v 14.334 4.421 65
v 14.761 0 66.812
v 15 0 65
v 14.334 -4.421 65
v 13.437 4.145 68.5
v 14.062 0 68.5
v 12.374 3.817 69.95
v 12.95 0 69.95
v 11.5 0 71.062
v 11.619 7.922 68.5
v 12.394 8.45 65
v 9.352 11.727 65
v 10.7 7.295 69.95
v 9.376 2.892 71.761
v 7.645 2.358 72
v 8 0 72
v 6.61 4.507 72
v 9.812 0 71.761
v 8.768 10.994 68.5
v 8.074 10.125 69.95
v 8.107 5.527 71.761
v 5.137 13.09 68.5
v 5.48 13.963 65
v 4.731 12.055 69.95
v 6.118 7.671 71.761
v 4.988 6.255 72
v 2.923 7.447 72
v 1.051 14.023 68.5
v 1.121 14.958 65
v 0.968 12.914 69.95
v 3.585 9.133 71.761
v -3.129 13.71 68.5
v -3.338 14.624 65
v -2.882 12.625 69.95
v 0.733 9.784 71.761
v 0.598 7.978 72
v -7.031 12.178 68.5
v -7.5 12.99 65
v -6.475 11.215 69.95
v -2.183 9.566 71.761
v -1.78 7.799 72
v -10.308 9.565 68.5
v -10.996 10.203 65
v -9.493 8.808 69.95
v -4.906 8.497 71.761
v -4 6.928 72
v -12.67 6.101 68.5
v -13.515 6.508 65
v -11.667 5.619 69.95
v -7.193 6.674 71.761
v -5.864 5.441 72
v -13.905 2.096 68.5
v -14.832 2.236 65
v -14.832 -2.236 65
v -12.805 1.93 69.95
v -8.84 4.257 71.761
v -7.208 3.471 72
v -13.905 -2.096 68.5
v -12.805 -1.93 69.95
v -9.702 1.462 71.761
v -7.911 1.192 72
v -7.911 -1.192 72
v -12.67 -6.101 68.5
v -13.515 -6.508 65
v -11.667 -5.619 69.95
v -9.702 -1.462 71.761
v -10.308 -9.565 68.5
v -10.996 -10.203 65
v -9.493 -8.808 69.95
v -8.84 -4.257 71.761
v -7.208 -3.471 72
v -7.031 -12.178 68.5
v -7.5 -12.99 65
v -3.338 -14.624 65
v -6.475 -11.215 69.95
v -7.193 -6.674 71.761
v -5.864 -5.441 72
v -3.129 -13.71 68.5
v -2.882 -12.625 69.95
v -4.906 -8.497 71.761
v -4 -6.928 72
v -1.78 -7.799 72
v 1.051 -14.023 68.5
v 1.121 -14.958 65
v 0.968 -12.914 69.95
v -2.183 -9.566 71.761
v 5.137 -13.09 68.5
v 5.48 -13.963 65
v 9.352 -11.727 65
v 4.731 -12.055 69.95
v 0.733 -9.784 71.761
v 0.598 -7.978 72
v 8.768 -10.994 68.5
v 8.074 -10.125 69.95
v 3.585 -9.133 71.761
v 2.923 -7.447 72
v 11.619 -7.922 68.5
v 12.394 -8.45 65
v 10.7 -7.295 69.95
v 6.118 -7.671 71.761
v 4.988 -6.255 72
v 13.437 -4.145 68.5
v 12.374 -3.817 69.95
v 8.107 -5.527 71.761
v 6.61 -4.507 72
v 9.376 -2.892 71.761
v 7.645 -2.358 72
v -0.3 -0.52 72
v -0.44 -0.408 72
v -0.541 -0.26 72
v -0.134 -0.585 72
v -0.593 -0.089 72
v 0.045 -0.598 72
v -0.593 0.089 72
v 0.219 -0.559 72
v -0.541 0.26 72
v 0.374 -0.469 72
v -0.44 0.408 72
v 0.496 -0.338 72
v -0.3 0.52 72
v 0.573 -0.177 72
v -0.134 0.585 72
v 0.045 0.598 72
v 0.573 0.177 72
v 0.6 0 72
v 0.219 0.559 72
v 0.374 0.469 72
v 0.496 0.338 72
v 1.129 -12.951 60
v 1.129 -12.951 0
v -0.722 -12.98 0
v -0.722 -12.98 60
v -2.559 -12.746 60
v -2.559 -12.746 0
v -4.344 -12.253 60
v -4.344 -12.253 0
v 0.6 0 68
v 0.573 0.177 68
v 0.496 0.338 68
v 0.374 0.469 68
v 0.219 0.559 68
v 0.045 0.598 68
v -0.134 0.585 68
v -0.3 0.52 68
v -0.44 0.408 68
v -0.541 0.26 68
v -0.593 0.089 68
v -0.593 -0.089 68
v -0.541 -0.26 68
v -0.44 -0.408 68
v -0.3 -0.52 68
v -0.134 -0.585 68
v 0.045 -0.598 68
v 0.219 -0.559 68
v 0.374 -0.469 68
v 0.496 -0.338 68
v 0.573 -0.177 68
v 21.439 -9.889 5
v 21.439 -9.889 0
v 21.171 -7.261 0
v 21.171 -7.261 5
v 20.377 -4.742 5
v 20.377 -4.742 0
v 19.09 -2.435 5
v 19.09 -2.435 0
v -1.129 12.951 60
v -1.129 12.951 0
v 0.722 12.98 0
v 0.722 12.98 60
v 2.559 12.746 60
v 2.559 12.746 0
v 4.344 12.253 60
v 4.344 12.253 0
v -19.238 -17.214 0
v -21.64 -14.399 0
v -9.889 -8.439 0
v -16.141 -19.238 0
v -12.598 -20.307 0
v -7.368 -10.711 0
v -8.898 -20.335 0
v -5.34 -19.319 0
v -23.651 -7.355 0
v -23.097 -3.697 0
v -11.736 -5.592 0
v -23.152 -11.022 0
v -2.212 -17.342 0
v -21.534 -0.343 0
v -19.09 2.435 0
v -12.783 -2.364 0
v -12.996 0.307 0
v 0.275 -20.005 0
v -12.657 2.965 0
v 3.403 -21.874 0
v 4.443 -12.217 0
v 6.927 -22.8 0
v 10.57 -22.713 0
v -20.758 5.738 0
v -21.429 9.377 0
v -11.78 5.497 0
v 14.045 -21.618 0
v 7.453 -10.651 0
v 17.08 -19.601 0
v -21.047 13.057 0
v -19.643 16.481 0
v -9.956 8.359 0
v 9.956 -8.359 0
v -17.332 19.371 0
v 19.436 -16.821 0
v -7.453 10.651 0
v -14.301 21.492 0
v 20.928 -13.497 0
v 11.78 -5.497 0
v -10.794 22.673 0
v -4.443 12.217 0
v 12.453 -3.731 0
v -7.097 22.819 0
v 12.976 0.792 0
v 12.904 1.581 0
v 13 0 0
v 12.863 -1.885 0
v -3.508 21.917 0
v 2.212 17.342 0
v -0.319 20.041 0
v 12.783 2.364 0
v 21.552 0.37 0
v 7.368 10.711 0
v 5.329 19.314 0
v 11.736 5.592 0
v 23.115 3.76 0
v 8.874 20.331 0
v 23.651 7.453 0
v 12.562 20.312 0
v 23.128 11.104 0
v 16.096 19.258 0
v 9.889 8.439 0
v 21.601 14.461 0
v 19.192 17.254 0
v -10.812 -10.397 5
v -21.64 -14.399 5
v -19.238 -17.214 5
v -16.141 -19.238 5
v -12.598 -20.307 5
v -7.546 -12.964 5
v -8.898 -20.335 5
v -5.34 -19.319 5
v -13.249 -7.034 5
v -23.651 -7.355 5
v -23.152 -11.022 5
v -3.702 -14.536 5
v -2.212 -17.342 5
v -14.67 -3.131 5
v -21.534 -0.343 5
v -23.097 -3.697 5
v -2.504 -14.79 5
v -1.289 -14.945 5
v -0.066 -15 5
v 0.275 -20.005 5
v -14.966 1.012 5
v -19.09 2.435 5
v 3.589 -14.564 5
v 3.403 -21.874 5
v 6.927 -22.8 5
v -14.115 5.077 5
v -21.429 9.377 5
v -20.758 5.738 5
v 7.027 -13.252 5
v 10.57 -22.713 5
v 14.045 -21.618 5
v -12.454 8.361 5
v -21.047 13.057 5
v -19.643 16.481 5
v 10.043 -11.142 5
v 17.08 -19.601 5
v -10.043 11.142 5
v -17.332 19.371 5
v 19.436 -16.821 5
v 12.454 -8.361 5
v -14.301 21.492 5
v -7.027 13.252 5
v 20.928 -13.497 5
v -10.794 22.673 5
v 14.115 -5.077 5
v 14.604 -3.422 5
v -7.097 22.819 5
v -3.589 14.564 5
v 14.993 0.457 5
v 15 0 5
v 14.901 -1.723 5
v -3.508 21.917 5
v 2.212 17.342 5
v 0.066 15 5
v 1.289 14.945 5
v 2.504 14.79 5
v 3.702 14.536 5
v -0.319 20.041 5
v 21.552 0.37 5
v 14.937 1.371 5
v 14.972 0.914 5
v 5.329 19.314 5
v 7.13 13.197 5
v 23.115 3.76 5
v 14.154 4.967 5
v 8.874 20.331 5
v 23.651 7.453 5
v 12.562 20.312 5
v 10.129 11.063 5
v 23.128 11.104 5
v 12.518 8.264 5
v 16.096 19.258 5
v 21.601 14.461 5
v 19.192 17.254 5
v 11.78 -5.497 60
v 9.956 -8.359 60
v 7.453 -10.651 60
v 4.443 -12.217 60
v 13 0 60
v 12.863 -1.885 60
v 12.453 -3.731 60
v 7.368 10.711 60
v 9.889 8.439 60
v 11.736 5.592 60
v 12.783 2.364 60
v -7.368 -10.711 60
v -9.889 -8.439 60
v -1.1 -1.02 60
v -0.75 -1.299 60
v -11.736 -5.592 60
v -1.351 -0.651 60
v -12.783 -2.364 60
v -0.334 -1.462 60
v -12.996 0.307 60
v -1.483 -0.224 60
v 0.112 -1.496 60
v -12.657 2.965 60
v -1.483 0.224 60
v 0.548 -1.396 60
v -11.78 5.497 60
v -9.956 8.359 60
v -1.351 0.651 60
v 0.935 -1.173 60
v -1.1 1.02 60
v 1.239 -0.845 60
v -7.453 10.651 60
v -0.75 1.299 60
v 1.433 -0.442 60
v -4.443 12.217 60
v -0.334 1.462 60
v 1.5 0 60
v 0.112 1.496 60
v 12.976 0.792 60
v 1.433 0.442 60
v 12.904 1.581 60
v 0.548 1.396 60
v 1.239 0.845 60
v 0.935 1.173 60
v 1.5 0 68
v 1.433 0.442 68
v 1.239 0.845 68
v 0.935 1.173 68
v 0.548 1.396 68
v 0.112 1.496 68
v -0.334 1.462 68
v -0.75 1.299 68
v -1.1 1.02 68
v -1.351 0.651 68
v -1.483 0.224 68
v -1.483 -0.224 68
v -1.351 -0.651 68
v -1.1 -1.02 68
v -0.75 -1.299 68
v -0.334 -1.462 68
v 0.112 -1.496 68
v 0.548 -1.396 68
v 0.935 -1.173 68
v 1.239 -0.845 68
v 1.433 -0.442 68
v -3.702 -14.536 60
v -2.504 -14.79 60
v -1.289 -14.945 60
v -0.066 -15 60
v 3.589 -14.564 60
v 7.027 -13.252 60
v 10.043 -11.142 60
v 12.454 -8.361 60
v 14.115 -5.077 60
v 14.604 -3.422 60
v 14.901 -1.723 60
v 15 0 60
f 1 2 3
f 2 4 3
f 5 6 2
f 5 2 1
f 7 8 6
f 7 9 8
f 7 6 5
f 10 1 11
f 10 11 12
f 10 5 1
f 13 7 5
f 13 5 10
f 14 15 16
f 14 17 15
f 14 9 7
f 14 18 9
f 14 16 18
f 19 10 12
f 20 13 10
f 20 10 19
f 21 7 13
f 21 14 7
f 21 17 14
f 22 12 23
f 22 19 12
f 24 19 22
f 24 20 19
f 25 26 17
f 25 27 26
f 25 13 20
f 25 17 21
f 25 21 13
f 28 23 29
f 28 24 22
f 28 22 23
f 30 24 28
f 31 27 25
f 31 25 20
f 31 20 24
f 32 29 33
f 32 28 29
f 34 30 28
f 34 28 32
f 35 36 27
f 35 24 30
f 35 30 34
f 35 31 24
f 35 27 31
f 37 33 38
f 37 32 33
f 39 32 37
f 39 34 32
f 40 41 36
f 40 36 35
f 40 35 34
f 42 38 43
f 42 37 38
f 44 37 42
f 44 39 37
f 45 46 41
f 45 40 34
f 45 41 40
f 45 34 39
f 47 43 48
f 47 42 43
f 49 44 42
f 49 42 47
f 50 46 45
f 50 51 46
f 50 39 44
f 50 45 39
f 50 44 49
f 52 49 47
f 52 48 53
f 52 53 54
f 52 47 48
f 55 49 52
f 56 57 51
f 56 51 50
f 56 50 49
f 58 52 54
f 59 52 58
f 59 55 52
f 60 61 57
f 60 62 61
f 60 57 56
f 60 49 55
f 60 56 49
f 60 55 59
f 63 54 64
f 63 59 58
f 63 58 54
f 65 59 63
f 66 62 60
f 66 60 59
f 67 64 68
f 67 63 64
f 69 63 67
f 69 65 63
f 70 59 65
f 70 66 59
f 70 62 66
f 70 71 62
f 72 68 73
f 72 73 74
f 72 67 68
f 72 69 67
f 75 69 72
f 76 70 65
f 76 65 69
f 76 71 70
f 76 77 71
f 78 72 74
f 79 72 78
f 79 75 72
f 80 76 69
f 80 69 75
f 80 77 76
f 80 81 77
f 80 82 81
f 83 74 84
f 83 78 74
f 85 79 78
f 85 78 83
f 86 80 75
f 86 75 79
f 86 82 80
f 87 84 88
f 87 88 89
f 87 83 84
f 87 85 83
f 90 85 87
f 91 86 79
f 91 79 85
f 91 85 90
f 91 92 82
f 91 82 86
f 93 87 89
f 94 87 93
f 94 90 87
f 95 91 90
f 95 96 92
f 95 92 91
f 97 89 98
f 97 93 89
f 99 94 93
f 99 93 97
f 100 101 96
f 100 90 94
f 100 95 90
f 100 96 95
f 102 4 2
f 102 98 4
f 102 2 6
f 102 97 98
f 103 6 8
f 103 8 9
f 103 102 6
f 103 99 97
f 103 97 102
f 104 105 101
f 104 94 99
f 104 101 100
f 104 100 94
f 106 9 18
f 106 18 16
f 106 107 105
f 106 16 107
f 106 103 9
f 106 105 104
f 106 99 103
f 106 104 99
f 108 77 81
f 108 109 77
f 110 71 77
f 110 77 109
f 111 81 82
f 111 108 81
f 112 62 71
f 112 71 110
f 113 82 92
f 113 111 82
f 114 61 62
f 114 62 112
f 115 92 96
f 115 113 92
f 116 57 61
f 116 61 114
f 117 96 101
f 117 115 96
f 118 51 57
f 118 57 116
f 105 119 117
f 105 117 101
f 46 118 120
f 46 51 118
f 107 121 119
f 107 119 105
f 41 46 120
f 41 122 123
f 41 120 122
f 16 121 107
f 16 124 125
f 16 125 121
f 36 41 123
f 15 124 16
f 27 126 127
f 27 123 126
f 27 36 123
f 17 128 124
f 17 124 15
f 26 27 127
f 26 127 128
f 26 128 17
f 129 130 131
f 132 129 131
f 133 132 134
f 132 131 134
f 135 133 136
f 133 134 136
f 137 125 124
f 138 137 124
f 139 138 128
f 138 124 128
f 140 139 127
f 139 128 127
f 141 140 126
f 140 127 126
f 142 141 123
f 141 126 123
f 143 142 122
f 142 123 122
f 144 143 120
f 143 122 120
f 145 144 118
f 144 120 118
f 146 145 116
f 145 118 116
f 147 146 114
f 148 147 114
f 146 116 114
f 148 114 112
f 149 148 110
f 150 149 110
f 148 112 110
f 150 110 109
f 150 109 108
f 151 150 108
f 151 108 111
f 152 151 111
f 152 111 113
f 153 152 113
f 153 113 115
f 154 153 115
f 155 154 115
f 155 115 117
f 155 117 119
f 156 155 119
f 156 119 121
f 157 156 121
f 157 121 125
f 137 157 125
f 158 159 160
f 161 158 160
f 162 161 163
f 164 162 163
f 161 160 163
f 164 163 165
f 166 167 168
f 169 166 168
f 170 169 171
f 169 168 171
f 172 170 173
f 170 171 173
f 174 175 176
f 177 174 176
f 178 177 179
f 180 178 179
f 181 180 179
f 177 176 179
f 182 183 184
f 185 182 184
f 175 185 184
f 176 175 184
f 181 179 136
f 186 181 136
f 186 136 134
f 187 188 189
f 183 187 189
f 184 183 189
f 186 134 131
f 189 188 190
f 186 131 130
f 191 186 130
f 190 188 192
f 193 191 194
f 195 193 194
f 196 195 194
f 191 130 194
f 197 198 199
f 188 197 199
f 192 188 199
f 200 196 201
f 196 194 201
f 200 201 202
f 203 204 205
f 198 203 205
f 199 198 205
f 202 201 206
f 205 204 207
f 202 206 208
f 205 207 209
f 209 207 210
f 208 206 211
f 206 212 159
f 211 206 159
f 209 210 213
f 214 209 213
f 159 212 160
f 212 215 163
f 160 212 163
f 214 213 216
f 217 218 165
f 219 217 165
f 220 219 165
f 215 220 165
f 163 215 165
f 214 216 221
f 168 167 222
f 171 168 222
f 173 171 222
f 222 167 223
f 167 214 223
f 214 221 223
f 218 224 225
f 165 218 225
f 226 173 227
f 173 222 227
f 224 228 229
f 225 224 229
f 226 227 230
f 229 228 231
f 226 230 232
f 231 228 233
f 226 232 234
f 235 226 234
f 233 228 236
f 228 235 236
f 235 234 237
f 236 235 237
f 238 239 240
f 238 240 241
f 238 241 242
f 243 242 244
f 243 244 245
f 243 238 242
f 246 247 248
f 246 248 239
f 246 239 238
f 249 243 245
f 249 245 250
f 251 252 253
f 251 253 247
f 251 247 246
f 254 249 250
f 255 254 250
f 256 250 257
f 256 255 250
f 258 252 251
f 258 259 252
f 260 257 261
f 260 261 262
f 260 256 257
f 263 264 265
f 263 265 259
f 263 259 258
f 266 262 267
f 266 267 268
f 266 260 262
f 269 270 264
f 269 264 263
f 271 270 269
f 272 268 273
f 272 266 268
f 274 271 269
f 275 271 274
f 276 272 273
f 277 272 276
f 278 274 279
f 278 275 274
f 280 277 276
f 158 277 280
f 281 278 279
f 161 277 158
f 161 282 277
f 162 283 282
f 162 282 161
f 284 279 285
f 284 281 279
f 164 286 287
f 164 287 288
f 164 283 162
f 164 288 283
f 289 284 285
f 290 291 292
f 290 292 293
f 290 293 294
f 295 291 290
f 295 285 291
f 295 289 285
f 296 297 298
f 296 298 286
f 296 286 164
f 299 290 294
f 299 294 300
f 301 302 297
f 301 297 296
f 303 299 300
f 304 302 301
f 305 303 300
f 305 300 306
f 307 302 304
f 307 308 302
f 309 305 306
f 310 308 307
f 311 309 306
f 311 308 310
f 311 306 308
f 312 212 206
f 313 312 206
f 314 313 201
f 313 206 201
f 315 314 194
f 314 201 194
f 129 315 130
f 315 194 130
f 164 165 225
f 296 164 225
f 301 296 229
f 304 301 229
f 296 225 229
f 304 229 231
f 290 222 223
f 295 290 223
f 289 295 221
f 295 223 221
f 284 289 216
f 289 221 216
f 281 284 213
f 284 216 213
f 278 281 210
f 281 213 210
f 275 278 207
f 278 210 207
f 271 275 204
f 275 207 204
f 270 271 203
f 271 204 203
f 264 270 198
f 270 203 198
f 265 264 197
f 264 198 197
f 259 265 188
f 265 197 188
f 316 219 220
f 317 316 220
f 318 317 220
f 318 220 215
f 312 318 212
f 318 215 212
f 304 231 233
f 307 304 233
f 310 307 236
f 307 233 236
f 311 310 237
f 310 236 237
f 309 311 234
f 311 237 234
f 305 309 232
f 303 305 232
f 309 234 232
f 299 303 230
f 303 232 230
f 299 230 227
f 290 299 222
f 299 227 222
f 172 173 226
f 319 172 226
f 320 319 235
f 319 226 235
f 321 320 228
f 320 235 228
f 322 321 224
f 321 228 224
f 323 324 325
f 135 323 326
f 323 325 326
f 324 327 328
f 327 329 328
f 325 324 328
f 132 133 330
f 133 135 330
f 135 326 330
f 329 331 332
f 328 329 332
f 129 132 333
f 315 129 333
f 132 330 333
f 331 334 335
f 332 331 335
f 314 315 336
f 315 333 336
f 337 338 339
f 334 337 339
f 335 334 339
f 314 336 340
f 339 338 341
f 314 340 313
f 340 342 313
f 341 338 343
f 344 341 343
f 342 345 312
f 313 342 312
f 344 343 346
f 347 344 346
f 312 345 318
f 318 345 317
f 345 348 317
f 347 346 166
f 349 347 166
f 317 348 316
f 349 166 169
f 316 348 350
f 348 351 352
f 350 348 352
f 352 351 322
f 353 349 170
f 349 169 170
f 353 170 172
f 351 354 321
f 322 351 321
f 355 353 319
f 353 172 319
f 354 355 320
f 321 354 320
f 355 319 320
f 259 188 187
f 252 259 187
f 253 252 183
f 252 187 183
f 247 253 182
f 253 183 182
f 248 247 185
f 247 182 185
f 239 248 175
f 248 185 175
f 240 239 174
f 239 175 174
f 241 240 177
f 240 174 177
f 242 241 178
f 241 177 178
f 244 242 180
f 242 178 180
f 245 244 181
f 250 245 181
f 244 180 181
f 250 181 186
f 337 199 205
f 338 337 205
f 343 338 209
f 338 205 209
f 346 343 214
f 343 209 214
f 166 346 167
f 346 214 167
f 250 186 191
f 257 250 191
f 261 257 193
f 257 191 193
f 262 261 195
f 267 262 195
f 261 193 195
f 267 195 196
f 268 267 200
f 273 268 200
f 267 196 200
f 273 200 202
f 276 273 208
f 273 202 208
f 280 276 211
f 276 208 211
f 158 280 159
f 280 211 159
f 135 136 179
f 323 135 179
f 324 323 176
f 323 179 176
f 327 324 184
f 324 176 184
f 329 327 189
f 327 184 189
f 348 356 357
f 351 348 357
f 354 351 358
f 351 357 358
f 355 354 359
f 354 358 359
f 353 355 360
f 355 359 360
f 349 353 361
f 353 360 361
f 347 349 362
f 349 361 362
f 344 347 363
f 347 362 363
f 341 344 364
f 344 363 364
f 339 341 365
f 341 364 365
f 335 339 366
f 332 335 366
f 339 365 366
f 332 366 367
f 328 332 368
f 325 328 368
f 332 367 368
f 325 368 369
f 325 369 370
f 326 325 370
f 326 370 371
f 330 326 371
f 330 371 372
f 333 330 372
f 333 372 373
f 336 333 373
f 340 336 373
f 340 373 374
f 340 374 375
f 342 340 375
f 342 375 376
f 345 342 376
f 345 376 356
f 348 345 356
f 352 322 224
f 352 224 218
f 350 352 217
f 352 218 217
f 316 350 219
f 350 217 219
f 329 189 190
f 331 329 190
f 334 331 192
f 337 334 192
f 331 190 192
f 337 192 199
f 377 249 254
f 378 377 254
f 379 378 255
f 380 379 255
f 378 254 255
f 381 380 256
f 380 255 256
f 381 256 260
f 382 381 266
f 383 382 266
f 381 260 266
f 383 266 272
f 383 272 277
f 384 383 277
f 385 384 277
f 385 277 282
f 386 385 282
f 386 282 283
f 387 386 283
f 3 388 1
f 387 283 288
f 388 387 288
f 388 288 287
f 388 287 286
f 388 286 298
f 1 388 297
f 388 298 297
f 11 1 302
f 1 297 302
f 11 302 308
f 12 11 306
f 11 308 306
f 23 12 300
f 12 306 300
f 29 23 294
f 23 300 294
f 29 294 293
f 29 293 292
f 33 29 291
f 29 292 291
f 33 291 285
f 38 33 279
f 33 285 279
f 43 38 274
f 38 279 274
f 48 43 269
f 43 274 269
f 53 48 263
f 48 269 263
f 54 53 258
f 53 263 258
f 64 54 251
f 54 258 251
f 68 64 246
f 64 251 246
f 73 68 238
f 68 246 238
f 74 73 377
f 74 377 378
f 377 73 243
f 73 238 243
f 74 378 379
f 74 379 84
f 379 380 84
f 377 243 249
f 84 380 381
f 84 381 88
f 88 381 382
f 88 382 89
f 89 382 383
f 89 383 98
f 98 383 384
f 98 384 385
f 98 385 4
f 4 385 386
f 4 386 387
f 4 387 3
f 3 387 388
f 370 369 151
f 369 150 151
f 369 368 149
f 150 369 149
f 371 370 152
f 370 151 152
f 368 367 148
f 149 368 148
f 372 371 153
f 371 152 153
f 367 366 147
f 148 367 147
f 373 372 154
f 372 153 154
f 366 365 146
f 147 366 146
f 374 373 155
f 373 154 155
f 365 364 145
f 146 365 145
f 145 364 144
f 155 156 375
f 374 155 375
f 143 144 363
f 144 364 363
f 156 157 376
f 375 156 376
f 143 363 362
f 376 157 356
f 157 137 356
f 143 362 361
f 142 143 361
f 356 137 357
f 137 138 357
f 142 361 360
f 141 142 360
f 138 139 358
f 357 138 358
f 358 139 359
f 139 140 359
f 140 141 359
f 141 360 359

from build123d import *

# Parameters (mm, degrees)
F1_DEPTH  = 60
F2_DEPTH  = 5
F3_R      = 15
F4_DEPTH  = 8
F5_R      = 1.5
F6_DEPTH  = 68.001
F7_R      = 15
F8_DEPTH  = 4
F9_R      = 0.6
F11_DEPTH = 72.001


# Not quite as in the source:
# - a fillet or chamfer that OpenCascade refuses, or shapes differently, is made with other operations: its cross-section is extruded or revolved along the edge and cut away or added


with BuildPart() as f1:
    # F0 (on Top) → F1 (new body)
    with BuildSketch(Plane.XY):
        with BuildLine():
            ThreePointArc((4.344342247, 12.2526197379), (9.8886206176, 8.4389088324), (12.7832510794, 2.3639991203))
            ThreePointArc((12.7832510794, 2.3639991203), (13.8829504808, 1.9165651298), (14.9372441283, 1.3706705849))
            ThreePointArc((14.9372441283, 1.3706705849), (11.4099468664, 9.7372024989), (3.7020104756, 14.5359938923))
            ThreePointArc((3.7020104756, 14.5359938923), (4.0753636897, 13.4089875362), (4.344342247, 12.2526197379))
        make_face()
        with BuildLine():
            ThreePointArc((12.7832510794, 2.3639991203), (12.9456993637, 1.1869574482), (13, 0))
            ThreePointArc((13, 0), (12.6914373848, -2.8155669247), (11.7803973681, -5.4974755888))
            ThreePointArc((11.7803973681, -5.4974755888), (12.9572055714, -5.3404456491), (14.1147802532, -5.0767094072))
            ThreePointArc((14.1147802532, -5.0767094072), (14.7770379948, -2.5766544396), (15, 0))
            ThreePointArc((15, 0), (14.9843028187, 0.6860532326), (14.9372441283, 1.3706705849))
            ThreePointArc((14.9372441283, 1.3706705849), (13.8829504808, 1.9165651298), (12.7832510794, 2.3639991203))
        make_face()
        with BuildLine():
            ThreePointArc((14.1147802532, -5.0767094072), (12.9572055714, -5.3404456491), (11.7803973681, -5.4974755888))
            ThreePointArc((11.7803973681, -5.4974755888), (7.453385593, -10.6511522007), (1.1292451674, -12.9508611819))
            ThreePointArc((1.1292451674, -12.9508611819), (0.5785791746, -14.0026705342), (-0.0657478246, -14.9998559068))
            ThreePointArc((-0.0657478246, -14.9998559068), (8.6000602997, -12.2897910008), (14.1147802532, -5.0767094072))
        make_face()
        with BuildLine():
            ThreePointArc((-0.0657478246, -14.9998559068), (0.5785791746, -14.0026705342), (1.1292451674, -12.9508611819))
            ThreePointArc((1.1292451674, -12.9508611819), (-1.6450220625, -12.8954993084), (-4.344342247, -12.2526197379))
            ThreePointArc((-4.344342247, -12.2526197379), (-4.0753636897, -13.4089875362), (-3.7020104756, -14.5359938923))
            ThreePointArc((-3.7020104756, -14.5359938923), (-1.8981023799, -14.879422279), (-0.0657478246, -14.9998559068))
        make_face()
        with BuildLine():
            ThreePointArc((-3.7020104756, -14.5359938923), (-4.0753636897, -13.4089875362), (-4.344342247, -12.2526197379))
            ThreePointArc((-4.344342247, -12.2526197379), (-9.8886206176, -8.4389088324), (-12.7832510794, -2.3639991203))
            ThreePointArc((-12.7832510794, -2.3639991203), (-13.8829504808, -1.9165651298), (-14.9372441283, -1.3706705849))
            ThreePointArc((-14.9372441283, -1.3706705849), (-11.4099468664, -9.7372024989), (-3.7020104756, -14.5359938923))
        make_face()
        with BuildLine():
            ThreePointArc((-12.7832510794, -2.3639991203), (-12.8954993084, 1.6450220625), (-11.7803973681, 5.4974755888))
            ThreePointArc((-11.7803973681, 5.4974755888), (-12.9572055714, 5.3404456491), (-14.1147802532, 5.0767094072))
            ThreePointArc((-14.1147802532, 5.0767094072), (-14.879422279, 1.8981023799), (-14.9372441283, -1.3706705849))
            ThreePointArc((-14.9372441283, -1.3706705849), (-13.8829504808, -1.9165651298), (-12.7832510794, -2.3639991203))
        make_face()
        with BuildLine():
            ThreePointArc((-11.7803973681, 5.4974755888), (-7.453385593, 10.6511522007), (-1.1292451674, 12.9508611819))
            ThreePointArc((-1.1292451674, 12.9508611819), (-0.5785791746, 14.0026705342), (0.0657478246, 14.9998559068))
            ThreePointArc((0.0657478246, 14.9998559068), (-8.6000602997, 12.2897910008), (-14.1147802532, 5.0767094072))
            ThreePointArc((-14.1147802532, 5.0767094072), (-12.9572055714, 5.3404456491), (-11.7803973681, 5.4974755888))
        make_face()
        with BuildLine():
            ThreePointArc((-1.1292451674, 12.9508611819), (1.6450220625, 12.8954993084), (4.344342247, 12.2526197379))
            ThreePointArc((4.344342247, 12.2526197379), (4.0753636897, 13.4089875362), (3.7020104756, 14.5359938923))
            ThreePointArc((3.7020104756, 14.5359938923), (1.8981023799, 14.879422279), (0.0657478246, 14.9998559068))
            ThreePointArc((0.0657478246, 14.9998559068), (-0.5785791746, 14.0026705342), (-1.1292451674, 12.9508611819))
        make_face()
    extrude(amount=F1_DEPTH)

    # F0 (on Top) → F2 (join)
    with BuildSketch(Plane.XY):
        with BuildLine():
            ThreePointArc((3.7020104756, 14.5359938923), (11.4099468664, 9.7372024989), (14.9372441283, 1.3706705849))
            ThreePointArc((14.9372441283, 1.3706705849), (17.2222714986, -0.3046475231), (19.0900610331, -2.4352350245))
            ThreePointArc((19.0900610331, -2.4352350245), (22.4559354435, 2.0084712145), (23.6511522007, 7.453385593))
            ThreePointArc((23.6511522007, 7.453385593), (16.0960665792, 19.2581688359), (2.2122433682, 17.3420062106))
            ThreePointArc((2.2122433682, 17.3420062106), (3.0431666419, 15.9846802304), (3.7020104756, 14.5359938923))
        make_face()
        with BuildLine():
            ThreePointArc((19.0900610331, -2.4352350245), (17.2222714986, -0.3046475231), (14.9372441283, 1.3706705849))
            ThreePointArc((14.9372441283, 1.3706705849), (14.9843028187, 0.6860532326), (15, 0))
            ThreePointArc((15, 0), (14.7770379948, -2.5766544396), (14.1147802532, -5.0767094072))
            ThreePointArc((14.1147802532, -5.0767094072), (16.7472118135, -4.0286898812), (19.0900610331, -2.4352350245))
        make_face()
        with BuildLine():
            ThreePointArc((19.0900610331, -2.4352350245), (16.7472118135, -4.0286898812), (14.1147802532, -5.0767094072))
            ThreePointArc((14.1147802532, -5.0767094072), (8.6000602997, -12.2897910008), (-0.0657478246, -14.9998559068))
            ThreePointArc((-0.0657478246, -14.9998559068), (-1.0671791062, -16.2367482592), (-2.2122433682, -17.3420062106))
            ThreePointArc((-2.2122433682, -17.3420062106), (12.346275042, -22.2875112657), (21.4389088324, -9.8886206176))
            ThreePointArc((21.4389088324, -9.8886206176), (20.8377994805, -5.981254408), (19.0900610331, -2.4352350245))
        make_face()
        with BuildLine():
            ThreePointArc((0.0657478246, 14.9998559068), (1.8981023799, 14.879422279), (3.7020104756, 14.5359938923))
            ThreePointArc((3.7020104756, 14.5359938923), (3.0431666419, 15.9846802304), (2.2122433682, 17.3420062106))
            ThreePointArc((2.2122433682, 17.3420062106), (1.0671791062, 16.2367482592), (0.0657478246, 14.9998559068))
        make_face()
        with BuildLine():
            ThreePointArc((-2.2122433682, -17.3420062106), (-1.0671791062, -16.2367482592), (-0.0657478246, -14.9998559068))
            ThreePointArc((-0.0657478246, -14.9998559068), (-1.8981023799, -14.879422279), (-3.7020104756, -14.5359938923))
            ThreePointArc((-3.7020104756, -14.5359938923), (-3.0431666419, -15.9846802304), (-2.2122433682, -17.3420062106))
        make_face()
        with BuildLine():
            ThreePointArc((-14.1147802532, 5.0767094072), (-8.6000602997, 12.2897910008), (0.0657478246, 14.9998559068))
            ThreePointArc((0.0657478246, 14.9998559068), (1.0671791062, 16.2367482592), (2.2122433682, 17.3420062106))
            ThreePointArc((2.2122433682, 17.3420062106), (-15.8922944255, 20.5397728182), (-19.0900610331, 2.4352350245))
            ThreePointArc((-19.0900610331, 2.4352350245), (-16.7472118135, 4.0286898812), (-14.1147802532, 5.0767094072))
        make_face()
        with BuildLine():
            ThreePointArc((-2.2122433682, -17.3420062106), (-3.0431666419, -15.9846802304), (-3.7020104756, -14.5359938923))
            ThreePointArc((-3.7020104756, -14.5359938923), (-11.4099468664, -9.7372024989), (-14.9372441283, -1.3706705849))
            ThreePointArc((-14.9372441283, -1.3706705849), (-17.2222714986, 0.3046475231), (-19.0900610331, 2.4352350245))
            ThreePointArc((-19.0900610331, 2.4352350245), (-20.5397728182, -15.8922944255), (-2.2122433682, -17.3420062106))
        make_face()
        with BuildLine():
            ThreePointArc((-14.9372441283, -1.3706705849), (-14.879422279, 1.8981023799), (-14.1147802532, 5.0767094072))
            ThreePointArc((-14.1147802532, 5.0767094072), (-16.7472118135, 4.0286898812), (-19.0900610331, 2.4352350245))
            ThreePointArc((-19.0900610331, 2.4352350245), (-17.2222714986, 0.3046475231), (-14.9372441283, -1.3706705849))
        make_face()
    extrude(amount=F2_DEPTH)

    # F3 (on face) → F4 (join)
    with BuildSketch(Plane.XY.offset(60)):
        Circle(F3_R)
    extrude(amount=F4_DEPTH)

    # F5 (on face) → F6 (cut, through all)
    with BuildSketch(Plane.XY.offset(68)):
        Circle(F5_R)
    extrude(amount=-F6_DEPTH, mode=Mode.SUBTRACT)

    # F7 (on face) → F8 (join)
    with BuildSketch(Plane.XY.offset(68)):
        Circle(F7_R)
    extrude(amount=F8_DEPTH)

    # F10: fillet of radius 7 on 1 edges, made by hand

    # F10_s1 → F10_t2 (revolve, cut)
    with BuildSketch(Plane.XZ):
        with BuildLine():
            ThreePointArc((15, 65), (12.9497474683, 69.9497474683), (8, 72))
            Line((8, 72), (15, 72))
            Line((15, 72), (15, 65))
        make_face()
    revolve(axis=Axis((0, 0, 72), (0, 0, 1)), mode=Mode.SUBTRACT)

    # F9 (on face) → F11 (cut, through all)
    with BuildSketch(Plane.XY.offset(72)):
        Circle(F9_R)
    extrude(amount=-F11_DEPTH, mode=Mode.SUBTRACT)


solid = f1.part
